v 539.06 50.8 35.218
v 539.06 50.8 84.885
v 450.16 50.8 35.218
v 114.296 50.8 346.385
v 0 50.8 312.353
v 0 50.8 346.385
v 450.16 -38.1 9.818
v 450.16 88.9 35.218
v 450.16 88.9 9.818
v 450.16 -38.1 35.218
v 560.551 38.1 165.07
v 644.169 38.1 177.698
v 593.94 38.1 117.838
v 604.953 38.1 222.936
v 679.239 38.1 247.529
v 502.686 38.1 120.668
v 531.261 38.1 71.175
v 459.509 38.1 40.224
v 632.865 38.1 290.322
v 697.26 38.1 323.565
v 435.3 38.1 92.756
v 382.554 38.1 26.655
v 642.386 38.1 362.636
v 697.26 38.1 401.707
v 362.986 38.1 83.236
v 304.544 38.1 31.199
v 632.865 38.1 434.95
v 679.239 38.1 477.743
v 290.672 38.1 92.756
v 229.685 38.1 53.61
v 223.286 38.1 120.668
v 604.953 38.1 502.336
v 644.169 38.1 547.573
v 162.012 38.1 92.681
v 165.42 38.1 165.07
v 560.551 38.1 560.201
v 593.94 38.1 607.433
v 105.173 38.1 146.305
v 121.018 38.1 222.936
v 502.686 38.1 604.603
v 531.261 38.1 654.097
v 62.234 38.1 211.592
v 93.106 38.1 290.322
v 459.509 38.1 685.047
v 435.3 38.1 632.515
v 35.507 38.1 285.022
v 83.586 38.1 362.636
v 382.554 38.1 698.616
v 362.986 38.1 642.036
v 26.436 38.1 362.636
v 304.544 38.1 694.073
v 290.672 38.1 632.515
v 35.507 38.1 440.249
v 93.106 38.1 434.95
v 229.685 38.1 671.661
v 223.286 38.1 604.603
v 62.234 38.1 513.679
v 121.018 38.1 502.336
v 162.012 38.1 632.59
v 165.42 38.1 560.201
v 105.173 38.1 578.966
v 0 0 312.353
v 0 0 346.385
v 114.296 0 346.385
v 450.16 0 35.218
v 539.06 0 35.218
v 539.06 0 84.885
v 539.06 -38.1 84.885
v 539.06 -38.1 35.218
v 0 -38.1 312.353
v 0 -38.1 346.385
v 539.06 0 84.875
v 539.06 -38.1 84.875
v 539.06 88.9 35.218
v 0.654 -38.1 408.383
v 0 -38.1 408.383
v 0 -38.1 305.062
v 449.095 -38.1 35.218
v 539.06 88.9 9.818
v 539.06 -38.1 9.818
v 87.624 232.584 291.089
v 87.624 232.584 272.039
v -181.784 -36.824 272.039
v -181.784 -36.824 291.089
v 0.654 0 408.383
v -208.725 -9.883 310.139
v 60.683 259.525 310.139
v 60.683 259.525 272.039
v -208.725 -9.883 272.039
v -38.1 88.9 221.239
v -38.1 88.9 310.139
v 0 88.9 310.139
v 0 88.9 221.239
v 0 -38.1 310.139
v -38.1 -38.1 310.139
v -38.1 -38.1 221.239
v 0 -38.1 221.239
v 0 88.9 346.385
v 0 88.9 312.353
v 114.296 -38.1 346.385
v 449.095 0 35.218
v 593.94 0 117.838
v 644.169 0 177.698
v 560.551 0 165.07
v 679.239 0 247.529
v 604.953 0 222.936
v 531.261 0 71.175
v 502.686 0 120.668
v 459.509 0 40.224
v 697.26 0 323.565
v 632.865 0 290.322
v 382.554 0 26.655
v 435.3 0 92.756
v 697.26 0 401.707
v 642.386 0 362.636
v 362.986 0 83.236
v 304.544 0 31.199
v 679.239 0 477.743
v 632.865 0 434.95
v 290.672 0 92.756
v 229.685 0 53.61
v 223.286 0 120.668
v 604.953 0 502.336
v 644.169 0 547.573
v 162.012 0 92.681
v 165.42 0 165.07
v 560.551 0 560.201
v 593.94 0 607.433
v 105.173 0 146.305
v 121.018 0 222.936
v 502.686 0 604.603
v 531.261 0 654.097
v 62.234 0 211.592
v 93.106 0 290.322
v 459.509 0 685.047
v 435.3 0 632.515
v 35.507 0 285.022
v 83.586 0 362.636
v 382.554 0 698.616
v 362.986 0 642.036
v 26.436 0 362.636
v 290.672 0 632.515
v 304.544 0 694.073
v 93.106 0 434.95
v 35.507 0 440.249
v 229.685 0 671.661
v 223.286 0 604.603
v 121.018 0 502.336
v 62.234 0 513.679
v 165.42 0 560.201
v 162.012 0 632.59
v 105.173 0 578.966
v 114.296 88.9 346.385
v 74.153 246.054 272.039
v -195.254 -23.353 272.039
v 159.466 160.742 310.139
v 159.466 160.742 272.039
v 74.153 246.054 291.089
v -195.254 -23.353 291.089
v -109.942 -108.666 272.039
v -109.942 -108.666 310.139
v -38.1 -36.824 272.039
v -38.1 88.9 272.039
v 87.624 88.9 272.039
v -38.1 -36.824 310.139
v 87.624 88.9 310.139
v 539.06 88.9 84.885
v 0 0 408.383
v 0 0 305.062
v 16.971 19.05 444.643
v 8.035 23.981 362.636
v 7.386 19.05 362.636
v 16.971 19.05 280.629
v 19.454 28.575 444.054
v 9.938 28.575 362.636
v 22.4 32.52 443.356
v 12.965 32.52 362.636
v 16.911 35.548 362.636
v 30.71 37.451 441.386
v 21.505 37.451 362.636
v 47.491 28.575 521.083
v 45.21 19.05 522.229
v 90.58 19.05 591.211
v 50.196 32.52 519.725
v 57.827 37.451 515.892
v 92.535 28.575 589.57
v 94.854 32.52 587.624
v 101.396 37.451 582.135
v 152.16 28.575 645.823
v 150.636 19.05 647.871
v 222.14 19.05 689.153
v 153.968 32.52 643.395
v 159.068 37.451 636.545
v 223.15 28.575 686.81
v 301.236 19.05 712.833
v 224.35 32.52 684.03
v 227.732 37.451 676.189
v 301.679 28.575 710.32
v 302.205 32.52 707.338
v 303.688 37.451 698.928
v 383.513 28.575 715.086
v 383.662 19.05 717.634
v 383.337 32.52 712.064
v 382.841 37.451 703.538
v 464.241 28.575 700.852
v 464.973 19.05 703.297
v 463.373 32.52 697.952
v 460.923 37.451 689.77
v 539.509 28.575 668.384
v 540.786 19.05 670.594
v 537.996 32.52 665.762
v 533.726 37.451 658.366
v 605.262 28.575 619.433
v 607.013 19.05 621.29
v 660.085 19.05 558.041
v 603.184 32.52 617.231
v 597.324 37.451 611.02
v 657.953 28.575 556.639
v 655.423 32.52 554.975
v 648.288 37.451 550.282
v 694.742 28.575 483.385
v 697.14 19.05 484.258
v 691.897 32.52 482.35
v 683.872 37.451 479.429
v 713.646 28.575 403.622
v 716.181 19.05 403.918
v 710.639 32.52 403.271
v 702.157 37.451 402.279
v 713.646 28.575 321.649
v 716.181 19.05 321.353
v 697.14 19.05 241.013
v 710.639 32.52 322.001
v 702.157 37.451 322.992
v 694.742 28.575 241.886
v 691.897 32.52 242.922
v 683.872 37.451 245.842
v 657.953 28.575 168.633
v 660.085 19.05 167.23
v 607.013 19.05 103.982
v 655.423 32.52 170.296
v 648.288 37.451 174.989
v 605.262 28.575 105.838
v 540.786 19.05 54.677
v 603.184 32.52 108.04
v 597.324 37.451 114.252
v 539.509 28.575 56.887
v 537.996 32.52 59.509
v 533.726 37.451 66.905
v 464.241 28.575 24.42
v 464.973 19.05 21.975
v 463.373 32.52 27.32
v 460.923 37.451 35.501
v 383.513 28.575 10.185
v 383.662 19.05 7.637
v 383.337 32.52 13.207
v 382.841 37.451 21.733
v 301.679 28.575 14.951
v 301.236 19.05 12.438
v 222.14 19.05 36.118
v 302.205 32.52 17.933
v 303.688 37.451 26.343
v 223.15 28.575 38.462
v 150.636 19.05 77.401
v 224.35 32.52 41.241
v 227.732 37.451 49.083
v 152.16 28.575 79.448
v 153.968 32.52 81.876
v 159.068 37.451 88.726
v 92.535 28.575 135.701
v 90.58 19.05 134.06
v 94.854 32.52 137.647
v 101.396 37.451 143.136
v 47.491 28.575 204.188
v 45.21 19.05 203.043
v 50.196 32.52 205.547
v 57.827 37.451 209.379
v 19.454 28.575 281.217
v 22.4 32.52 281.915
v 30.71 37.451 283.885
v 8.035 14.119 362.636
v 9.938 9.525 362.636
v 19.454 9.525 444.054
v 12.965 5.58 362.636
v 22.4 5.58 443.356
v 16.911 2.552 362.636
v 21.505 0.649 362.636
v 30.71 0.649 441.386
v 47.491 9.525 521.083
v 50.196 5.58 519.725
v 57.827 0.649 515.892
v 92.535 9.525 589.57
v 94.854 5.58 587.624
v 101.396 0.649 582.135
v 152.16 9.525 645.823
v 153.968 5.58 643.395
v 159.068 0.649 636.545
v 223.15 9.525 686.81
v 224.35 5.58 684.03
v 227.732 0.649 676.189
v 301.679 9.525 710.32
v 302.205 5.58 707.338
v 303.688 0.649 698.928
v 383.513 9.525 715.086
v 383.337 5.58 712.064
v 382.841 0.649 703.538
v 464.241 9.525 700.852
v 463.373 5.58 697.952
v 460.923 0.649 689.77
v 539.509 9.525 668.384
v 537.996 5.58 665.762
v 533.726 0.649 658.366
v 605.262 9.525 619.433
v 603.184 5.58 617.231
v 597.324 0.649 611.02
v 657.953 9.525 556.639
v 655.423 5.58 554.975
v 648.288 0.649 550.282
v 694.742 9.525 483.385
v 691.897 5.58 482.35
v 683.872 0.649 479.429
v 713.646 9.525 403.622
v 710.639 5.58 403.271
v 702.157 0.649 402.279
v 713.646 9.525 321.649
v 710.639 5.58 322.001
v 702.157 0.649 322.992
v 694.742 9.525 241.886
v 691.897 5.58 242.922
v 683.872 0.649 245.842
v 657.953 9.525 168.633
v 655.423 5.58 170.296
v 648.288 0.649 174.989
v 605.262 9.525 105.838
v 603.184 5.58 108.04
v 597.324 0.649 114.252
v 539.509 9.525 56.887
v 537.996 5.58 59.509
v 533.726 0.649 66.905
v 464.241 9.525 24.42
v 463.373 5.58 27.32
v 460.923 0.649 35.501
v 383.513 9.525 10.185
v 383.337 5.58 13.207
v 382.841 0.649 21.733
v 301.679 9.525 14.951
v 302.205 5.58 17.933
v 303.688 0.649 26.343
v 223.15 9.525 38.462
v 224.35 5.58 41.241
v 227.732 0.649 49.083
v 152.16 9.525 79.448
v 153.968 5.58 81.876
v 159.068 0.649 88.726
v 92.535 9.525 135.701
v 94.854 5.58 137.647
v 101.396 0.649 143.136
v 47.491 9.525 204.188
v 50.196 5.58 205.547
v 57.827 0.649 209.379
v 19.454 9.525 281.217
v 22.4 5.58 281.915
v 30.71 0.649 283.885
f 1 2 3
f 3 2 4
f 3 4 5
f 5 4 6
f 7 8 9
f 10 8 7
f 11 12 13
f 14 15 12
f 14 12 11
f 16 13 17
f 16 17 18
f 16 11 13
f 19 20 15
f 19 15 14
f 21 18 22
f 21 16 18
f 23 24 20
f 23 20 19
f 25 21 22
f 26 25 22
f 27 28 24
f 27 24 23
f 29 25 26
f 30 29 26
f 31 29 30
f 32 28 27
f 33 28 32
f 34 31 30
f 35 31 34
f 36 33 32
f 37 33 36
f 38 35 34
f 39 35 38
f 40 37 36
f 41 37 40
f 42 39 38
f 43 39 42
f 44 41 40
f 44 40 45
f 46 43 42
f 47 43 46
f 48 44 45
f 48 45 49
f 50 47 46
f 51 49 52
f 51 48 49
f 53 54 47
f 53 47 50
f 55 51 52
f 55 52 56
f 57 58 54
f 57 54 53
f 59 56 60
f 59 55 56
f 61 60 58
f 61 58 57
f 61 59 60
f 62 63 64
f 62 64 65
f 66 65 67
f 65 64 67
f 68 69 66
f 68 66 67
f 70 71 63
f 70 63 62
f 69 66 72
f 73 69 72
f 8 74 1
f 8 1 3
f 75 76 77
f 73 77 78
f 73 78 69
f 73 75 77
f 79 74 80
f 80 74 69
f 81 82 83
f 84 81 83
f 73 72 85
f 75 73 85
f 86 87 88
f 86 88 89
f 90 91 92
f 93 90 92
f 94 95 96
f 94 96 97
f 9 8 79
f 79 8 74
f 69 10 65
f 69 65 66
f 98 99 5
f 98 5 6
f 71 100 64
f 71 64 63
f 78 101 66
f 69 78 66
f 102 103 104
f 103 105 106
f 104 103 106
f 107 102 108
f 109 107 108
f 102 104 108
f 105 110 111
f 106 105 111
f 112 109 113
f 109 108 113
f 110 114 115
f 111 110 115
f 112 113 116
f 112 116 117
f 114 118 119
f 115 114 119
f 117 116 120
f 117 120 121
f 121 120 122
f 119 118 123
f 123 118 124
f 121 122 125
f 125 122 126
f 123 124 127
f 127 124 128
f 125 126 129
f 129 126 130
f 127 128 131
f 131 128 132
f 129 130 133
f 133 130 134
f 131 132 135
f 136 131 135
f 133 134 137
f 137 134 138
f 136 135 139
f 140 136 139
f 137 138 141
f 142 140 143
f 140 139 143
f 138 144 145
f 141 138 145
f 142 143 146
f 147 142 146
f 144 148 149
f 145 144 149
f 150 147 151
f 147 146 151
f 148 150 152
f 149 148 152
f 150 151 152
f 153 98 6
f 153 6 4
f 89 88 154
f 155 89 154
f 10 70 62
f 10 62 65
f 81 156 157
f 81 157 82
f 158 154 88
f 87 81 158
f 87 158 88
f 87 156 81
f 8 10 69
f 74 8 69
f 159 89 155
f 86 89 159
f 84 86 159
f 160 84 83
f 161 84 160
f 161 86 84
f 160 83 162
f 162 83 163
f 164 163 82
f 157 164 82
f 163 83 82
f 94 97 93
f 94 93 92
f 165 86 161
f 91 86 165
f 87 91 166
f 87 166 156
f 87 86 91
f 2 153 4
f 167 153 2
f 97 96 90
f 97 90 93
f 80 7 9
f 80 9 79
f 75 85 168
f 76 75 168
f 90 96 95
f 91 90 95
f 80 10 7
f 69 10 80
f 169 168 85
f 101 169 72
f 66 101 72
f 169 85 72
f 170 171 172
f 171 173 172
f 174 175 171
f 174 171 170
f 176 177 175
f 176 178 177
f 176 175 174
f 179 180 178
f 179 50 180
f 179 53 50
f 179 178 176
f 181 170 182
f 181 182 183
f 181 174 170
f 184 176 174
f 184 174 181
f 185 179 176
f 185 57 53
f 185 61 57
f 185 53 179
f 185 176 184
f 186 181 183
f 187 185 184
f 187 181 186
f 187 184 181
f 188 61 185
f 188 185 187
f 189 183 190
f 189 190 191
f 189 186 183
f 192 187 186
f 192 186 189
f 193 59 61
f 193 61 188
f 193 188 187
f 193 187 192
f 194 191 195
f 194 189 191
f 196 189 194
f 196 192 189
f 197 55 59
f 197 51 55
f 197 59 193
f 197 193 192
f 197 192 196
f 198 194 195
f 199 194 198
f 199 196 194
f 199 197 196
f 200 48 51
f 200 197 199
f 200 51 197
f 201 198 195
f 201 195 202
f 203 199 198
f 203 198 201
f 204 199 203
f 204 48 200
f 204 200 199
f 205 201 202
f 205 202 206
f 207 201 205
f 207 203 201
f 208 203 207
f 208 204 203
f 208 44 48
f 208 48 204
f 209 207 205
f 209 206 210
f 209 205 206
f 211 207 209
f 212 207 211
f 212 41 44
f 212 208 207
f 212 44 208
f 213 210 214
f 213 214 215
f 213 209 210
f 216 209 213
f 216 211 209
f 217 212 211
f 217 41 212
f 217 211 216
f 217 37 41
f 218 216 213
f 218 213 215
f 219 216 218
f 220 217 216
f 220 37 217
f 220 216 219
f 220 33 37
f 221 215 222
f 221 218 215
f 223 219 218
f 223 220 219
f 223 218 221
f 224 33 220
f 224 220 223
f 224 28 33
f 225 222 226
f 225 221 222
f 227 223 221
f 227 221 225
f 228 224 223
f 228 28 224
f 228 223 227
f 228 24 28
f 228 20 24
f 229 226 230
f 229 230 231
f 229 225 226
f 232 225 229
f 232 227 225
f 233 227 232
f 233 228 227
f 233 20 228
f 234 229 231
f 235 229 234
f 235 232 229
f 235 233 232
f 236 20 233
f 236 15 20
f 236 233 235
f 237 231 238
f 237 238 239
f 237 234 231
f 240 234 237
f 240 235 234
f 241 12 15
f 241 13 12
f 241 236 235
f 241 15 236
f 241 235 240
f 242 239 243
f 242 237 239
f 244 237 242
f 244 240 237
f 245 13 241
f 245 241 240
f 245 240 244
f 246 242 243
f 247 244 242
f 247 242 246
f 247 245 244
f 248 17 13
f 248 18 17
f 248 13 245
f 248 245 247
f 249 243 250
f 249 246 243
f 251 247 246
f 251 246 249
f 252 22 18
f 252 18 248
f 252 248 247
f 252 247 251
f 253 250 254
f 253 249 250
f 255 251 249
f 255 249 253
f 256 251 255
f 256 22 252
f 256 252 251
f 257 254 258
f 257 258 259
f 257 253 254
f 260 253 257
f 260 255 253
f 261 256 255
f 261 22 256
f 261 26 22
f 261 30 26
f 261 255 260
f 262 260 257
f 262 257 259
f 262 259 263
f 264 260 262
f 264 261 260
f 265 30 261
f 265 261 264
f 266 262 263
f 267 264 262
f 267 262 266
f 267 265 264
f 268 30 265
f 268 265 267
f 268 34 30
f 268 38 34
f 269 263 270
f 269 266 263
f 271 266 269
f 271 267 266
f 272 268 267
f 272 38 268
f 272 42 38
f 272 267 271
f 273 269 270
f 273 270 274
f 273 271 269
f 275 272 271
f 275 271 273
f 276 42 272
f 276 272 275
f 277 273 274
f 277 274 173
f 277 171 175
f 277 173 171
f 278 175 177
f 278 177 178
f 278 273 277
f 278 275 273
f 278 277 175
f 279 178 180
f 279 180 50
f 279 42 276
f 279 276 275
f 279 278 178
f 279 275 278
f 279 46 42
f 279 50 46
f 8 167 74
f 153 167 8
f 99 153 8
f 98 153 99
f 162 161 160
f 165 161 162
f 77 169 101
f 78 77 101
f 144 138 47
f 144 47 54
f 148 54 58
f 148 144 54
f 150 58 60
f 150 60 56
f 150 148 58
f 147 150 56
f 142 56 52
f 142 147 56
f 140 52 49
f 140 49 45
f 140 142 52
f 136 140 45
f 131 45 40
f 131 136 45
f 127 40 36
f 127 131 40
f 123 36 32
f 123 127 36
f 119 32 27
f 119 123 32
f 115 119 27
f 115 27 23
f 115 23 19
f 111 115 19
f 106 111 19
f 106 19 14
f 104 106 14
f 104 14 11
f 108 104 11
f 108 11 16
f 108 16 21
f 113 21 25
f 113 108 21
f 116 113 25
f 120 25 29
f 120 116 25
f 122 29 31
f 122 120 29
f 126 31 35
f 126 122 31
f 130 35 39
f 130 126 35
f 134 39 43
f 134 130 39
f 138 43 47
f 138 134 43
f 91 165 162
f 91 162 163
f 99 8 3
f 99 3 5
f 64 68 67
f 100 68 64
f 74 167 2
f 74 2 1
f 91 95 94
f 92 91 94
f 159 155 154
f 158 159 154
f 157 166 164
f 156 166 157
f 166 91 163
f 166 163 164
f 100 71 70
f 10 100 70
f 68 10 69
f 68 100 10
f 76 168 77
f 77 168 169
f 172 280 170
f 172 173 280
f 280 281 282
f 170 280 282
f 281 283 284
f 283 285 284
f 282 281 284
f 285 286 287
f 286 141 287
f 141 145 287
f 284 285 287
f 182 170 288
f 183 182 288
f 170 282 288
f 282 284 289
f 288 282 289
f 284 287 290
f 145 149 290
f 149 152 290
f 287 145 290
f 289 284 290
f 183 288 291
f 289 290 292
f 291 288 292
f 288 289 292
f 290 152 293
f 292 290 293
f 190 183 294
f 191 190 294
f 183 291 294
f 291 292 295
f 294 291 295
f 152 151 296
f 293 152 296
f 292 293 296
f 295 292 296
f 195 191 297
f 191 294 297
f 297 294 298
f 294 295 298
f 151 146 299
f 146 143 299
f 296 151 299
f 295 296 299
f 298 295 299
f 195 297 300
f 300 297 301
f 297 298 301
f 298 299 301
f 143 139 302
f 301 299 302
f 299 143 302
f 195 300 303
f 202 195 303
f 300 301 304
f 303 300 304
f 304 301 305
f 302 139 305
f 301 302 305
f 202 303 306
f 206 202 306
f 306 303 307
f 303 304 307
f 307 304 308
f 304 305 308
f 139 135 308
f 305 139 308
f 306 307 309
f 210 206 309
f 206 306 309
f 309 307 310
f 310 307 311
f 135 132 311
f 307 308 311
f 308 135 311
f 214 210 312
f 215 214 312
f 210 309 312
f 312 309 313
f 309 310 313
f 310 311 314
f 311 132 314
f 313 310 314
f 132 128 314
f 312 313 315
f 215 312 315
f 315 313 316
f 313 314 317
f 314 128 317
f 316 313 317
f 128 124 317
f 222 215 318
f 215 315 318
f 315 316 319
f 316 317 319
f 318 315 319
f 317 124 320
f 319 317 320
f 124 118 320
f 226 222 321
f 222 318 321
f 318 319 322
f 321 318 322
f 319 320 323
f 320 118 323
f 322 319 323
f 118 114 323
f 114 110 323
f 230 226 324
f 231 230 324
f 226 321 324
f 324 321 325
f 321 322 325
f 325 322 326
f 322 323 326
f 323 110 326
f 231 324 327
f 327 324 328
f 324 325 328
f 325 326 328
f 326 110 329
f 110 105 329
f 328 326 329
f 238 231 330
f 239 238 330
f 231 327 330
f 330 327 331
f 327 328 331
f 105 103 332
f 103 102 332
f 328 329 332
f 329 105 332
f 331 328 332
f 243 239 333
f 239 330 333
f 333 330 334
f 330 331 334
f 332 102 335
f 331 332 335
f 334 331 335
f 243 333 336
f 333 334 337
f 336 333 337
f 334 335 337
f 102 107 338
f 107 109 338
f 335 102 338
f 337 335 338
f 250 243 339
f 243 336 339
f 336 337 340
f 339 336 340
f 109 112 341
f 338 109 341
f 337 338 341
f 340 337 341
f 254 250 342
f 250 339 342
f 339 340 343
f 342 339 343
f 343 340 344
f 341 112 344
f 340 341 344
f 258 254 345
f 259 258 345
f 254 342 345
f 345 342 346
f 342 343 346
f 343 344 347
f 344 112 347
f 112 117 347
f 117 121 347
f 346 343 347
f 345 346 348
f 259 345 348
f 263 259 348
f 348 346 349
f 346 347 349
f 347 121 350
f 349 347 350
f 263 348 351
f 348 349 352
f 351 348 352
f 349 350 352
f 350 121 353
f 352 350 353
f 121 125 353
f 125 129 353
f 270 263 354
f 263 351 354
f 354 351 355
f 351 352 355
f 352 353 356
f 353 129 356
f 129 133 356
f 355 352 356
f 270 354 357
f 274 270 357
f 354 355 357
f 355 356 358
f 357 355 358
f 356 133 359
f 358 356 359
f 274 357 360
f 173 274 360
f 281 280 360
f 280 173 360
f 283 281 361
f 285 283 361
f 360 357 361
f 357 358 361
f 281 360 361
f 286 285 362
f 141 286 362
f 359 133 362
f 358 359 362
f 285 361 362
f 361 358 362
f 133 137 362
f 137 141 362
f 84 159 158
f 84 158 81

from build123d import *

# Parameters (mm, degrees)
F1_DEPTH  = 38.1
F2_W      = 88.9
F2_H      = 127
F3_DEPTH  = 25.4
F5_W      = 38.1
F5_H      = 88.9
F6_DEPTH  = 127
F8_R      = 355.6
F8_R_2    = 279.4
F9_DEPTH  = 38.1
F10_R     = 19.04999
F12_DEPTH = 38.1
F14_DEPTH = 19.05
F16_DEPTH = 38.1
F19_DEPTH = 38.1


# Not quite as in the source:
# - a fillet or chamfer is up to 0.001 mm smaller than in the source, because OpenCascade refuses the exact size


with BuildPart() as f1:
    # F0 (on Front) → F1 (new body)
    with BuildSketch(Plane.XZ):
        Polygon((0, 305.0617762964), (449.0947908261, 35.2184022785), (539.0602625189, 35.2184022785), (539.0602625189, 84.8754022785), (0.6535882854, 408.382769847), (0, 408.382769847), align=None)
    extrude(amount=F1_DEPTH)


with BuildPart() as f3:
    # F2 (on face) → F3 (new body)
    with BuildSketch(Plane(origin=(0, 0, 35.2184022785), x_dir=(1, 0, 0), z_dir=(0, 0, -1))):
        with Locations((494.6102625189, -25.4)):
            Rectangle(F2_W, F2_H)
    extrude(amount=F3_DEPTH)


with BuildPart() as f6:
    # F5 (on face) → F6 (new body)
    with BuildSketch(Plane.XZ.offset(38.1)):
        with Locations((-19.05, 265.6888514042)):
            Rectangle(F5_W, F5_H)
    extrude(amount=-F6_DEPTH)


with BuildPart() as f9:
    # F8 (on face) → F9 (new body)
    with BuildSketch(Plane(origin=(0, 0, 0), x_dir=(-1, 0, 0), z_dir=(0, 1, 0))):
        with Locations((-362.9855811596, 362.6356720924)):
            Circle(F8_R)
        with Locations((-362.9855811596, 362.6356720924)):
            Circle(F8_R_2, mode=Mode.SUBTRACT)
    extrude(amount=F9_DEPTH)

    # F10 (radius 19.05 in the source; OpenCascade refuses exactly that, so slightly less here)
    f10_edges = [f9.edges().sort_by_distance(p)[0] for p in [
        (718.585581, 0, 362.635672),
        (718.585581, 38.1, 362.635672),
    ]]
    fillet(f10_edges, radius=F10_R)


with BuildPart() as f12:
    # F11 (on face) → F12 (new body)
    with BuildSketch(Plane.XY.offset(310.1388514042)):
        Polygon((60.6828173318, 259.5248663003), (-208.7248663003, -9.8828173318), (-109.9420489686, -108.6656346635), (-38.1, -36.823585695), (-38.1, 88.9), (87.623585695, 88.9), (159.4656346635, 160.7420489686), align=None)
    extrude(amount=-F12_DEPTH)

    # F13 (on face) → F14 (cut)
    with BuildSketch(Plane(origin=(0, 0, 272.0388514042), x_dir=(1, 0, 0), z_dir=(0, 0, -1))):
        Polygon((-181.7840979371, 36.823585695), (-195.2544821187, 23.3532015134), (74.1532015134, -246.0544821187), (87.623585695, -232.5840979371), align=None)
    extrude(amount=-F14_DEPTH, mode=Mode.SUBTRACT)


with BuildPart() as f16:
    # F15 (on face) → F16 (new body)
    with BuildSketch(Plane(origin=(0, 88.9, 0), x_dir=(-1, 0, 0), z_dir=(0, 1, 0))):
        Polygon((-539.0602625189, 84.8846760996), (-539.0602625189, 35.2184022785), (-450.1602625189, 35.2184022785), (0, 312.3531075877), (0, 346.3848079563), (-114.2958221575, 346.3848079563), align=None)
    extrude(amount=-F16_DEPTH)


with BuildPart() as f19:
    # F18 (on face) → F19 (new body)
    with BuildSketch(Plane.XZ.offset(38.1)):
        Polygon((539.0602625189, 35.2184022785), (539.0602625189, 84.8846760996), (114.2958221575, 346.3848079563), (0, 346.3848079563), (0, 312.3531075877), (450.1602625189, 35.2184022785), align=None)
    extrude(amount=-F19_DEPTH)


solid = Compound([f1.part, f3.part, f6.part, f9.part, f12.part, f16.part, f19.part])
